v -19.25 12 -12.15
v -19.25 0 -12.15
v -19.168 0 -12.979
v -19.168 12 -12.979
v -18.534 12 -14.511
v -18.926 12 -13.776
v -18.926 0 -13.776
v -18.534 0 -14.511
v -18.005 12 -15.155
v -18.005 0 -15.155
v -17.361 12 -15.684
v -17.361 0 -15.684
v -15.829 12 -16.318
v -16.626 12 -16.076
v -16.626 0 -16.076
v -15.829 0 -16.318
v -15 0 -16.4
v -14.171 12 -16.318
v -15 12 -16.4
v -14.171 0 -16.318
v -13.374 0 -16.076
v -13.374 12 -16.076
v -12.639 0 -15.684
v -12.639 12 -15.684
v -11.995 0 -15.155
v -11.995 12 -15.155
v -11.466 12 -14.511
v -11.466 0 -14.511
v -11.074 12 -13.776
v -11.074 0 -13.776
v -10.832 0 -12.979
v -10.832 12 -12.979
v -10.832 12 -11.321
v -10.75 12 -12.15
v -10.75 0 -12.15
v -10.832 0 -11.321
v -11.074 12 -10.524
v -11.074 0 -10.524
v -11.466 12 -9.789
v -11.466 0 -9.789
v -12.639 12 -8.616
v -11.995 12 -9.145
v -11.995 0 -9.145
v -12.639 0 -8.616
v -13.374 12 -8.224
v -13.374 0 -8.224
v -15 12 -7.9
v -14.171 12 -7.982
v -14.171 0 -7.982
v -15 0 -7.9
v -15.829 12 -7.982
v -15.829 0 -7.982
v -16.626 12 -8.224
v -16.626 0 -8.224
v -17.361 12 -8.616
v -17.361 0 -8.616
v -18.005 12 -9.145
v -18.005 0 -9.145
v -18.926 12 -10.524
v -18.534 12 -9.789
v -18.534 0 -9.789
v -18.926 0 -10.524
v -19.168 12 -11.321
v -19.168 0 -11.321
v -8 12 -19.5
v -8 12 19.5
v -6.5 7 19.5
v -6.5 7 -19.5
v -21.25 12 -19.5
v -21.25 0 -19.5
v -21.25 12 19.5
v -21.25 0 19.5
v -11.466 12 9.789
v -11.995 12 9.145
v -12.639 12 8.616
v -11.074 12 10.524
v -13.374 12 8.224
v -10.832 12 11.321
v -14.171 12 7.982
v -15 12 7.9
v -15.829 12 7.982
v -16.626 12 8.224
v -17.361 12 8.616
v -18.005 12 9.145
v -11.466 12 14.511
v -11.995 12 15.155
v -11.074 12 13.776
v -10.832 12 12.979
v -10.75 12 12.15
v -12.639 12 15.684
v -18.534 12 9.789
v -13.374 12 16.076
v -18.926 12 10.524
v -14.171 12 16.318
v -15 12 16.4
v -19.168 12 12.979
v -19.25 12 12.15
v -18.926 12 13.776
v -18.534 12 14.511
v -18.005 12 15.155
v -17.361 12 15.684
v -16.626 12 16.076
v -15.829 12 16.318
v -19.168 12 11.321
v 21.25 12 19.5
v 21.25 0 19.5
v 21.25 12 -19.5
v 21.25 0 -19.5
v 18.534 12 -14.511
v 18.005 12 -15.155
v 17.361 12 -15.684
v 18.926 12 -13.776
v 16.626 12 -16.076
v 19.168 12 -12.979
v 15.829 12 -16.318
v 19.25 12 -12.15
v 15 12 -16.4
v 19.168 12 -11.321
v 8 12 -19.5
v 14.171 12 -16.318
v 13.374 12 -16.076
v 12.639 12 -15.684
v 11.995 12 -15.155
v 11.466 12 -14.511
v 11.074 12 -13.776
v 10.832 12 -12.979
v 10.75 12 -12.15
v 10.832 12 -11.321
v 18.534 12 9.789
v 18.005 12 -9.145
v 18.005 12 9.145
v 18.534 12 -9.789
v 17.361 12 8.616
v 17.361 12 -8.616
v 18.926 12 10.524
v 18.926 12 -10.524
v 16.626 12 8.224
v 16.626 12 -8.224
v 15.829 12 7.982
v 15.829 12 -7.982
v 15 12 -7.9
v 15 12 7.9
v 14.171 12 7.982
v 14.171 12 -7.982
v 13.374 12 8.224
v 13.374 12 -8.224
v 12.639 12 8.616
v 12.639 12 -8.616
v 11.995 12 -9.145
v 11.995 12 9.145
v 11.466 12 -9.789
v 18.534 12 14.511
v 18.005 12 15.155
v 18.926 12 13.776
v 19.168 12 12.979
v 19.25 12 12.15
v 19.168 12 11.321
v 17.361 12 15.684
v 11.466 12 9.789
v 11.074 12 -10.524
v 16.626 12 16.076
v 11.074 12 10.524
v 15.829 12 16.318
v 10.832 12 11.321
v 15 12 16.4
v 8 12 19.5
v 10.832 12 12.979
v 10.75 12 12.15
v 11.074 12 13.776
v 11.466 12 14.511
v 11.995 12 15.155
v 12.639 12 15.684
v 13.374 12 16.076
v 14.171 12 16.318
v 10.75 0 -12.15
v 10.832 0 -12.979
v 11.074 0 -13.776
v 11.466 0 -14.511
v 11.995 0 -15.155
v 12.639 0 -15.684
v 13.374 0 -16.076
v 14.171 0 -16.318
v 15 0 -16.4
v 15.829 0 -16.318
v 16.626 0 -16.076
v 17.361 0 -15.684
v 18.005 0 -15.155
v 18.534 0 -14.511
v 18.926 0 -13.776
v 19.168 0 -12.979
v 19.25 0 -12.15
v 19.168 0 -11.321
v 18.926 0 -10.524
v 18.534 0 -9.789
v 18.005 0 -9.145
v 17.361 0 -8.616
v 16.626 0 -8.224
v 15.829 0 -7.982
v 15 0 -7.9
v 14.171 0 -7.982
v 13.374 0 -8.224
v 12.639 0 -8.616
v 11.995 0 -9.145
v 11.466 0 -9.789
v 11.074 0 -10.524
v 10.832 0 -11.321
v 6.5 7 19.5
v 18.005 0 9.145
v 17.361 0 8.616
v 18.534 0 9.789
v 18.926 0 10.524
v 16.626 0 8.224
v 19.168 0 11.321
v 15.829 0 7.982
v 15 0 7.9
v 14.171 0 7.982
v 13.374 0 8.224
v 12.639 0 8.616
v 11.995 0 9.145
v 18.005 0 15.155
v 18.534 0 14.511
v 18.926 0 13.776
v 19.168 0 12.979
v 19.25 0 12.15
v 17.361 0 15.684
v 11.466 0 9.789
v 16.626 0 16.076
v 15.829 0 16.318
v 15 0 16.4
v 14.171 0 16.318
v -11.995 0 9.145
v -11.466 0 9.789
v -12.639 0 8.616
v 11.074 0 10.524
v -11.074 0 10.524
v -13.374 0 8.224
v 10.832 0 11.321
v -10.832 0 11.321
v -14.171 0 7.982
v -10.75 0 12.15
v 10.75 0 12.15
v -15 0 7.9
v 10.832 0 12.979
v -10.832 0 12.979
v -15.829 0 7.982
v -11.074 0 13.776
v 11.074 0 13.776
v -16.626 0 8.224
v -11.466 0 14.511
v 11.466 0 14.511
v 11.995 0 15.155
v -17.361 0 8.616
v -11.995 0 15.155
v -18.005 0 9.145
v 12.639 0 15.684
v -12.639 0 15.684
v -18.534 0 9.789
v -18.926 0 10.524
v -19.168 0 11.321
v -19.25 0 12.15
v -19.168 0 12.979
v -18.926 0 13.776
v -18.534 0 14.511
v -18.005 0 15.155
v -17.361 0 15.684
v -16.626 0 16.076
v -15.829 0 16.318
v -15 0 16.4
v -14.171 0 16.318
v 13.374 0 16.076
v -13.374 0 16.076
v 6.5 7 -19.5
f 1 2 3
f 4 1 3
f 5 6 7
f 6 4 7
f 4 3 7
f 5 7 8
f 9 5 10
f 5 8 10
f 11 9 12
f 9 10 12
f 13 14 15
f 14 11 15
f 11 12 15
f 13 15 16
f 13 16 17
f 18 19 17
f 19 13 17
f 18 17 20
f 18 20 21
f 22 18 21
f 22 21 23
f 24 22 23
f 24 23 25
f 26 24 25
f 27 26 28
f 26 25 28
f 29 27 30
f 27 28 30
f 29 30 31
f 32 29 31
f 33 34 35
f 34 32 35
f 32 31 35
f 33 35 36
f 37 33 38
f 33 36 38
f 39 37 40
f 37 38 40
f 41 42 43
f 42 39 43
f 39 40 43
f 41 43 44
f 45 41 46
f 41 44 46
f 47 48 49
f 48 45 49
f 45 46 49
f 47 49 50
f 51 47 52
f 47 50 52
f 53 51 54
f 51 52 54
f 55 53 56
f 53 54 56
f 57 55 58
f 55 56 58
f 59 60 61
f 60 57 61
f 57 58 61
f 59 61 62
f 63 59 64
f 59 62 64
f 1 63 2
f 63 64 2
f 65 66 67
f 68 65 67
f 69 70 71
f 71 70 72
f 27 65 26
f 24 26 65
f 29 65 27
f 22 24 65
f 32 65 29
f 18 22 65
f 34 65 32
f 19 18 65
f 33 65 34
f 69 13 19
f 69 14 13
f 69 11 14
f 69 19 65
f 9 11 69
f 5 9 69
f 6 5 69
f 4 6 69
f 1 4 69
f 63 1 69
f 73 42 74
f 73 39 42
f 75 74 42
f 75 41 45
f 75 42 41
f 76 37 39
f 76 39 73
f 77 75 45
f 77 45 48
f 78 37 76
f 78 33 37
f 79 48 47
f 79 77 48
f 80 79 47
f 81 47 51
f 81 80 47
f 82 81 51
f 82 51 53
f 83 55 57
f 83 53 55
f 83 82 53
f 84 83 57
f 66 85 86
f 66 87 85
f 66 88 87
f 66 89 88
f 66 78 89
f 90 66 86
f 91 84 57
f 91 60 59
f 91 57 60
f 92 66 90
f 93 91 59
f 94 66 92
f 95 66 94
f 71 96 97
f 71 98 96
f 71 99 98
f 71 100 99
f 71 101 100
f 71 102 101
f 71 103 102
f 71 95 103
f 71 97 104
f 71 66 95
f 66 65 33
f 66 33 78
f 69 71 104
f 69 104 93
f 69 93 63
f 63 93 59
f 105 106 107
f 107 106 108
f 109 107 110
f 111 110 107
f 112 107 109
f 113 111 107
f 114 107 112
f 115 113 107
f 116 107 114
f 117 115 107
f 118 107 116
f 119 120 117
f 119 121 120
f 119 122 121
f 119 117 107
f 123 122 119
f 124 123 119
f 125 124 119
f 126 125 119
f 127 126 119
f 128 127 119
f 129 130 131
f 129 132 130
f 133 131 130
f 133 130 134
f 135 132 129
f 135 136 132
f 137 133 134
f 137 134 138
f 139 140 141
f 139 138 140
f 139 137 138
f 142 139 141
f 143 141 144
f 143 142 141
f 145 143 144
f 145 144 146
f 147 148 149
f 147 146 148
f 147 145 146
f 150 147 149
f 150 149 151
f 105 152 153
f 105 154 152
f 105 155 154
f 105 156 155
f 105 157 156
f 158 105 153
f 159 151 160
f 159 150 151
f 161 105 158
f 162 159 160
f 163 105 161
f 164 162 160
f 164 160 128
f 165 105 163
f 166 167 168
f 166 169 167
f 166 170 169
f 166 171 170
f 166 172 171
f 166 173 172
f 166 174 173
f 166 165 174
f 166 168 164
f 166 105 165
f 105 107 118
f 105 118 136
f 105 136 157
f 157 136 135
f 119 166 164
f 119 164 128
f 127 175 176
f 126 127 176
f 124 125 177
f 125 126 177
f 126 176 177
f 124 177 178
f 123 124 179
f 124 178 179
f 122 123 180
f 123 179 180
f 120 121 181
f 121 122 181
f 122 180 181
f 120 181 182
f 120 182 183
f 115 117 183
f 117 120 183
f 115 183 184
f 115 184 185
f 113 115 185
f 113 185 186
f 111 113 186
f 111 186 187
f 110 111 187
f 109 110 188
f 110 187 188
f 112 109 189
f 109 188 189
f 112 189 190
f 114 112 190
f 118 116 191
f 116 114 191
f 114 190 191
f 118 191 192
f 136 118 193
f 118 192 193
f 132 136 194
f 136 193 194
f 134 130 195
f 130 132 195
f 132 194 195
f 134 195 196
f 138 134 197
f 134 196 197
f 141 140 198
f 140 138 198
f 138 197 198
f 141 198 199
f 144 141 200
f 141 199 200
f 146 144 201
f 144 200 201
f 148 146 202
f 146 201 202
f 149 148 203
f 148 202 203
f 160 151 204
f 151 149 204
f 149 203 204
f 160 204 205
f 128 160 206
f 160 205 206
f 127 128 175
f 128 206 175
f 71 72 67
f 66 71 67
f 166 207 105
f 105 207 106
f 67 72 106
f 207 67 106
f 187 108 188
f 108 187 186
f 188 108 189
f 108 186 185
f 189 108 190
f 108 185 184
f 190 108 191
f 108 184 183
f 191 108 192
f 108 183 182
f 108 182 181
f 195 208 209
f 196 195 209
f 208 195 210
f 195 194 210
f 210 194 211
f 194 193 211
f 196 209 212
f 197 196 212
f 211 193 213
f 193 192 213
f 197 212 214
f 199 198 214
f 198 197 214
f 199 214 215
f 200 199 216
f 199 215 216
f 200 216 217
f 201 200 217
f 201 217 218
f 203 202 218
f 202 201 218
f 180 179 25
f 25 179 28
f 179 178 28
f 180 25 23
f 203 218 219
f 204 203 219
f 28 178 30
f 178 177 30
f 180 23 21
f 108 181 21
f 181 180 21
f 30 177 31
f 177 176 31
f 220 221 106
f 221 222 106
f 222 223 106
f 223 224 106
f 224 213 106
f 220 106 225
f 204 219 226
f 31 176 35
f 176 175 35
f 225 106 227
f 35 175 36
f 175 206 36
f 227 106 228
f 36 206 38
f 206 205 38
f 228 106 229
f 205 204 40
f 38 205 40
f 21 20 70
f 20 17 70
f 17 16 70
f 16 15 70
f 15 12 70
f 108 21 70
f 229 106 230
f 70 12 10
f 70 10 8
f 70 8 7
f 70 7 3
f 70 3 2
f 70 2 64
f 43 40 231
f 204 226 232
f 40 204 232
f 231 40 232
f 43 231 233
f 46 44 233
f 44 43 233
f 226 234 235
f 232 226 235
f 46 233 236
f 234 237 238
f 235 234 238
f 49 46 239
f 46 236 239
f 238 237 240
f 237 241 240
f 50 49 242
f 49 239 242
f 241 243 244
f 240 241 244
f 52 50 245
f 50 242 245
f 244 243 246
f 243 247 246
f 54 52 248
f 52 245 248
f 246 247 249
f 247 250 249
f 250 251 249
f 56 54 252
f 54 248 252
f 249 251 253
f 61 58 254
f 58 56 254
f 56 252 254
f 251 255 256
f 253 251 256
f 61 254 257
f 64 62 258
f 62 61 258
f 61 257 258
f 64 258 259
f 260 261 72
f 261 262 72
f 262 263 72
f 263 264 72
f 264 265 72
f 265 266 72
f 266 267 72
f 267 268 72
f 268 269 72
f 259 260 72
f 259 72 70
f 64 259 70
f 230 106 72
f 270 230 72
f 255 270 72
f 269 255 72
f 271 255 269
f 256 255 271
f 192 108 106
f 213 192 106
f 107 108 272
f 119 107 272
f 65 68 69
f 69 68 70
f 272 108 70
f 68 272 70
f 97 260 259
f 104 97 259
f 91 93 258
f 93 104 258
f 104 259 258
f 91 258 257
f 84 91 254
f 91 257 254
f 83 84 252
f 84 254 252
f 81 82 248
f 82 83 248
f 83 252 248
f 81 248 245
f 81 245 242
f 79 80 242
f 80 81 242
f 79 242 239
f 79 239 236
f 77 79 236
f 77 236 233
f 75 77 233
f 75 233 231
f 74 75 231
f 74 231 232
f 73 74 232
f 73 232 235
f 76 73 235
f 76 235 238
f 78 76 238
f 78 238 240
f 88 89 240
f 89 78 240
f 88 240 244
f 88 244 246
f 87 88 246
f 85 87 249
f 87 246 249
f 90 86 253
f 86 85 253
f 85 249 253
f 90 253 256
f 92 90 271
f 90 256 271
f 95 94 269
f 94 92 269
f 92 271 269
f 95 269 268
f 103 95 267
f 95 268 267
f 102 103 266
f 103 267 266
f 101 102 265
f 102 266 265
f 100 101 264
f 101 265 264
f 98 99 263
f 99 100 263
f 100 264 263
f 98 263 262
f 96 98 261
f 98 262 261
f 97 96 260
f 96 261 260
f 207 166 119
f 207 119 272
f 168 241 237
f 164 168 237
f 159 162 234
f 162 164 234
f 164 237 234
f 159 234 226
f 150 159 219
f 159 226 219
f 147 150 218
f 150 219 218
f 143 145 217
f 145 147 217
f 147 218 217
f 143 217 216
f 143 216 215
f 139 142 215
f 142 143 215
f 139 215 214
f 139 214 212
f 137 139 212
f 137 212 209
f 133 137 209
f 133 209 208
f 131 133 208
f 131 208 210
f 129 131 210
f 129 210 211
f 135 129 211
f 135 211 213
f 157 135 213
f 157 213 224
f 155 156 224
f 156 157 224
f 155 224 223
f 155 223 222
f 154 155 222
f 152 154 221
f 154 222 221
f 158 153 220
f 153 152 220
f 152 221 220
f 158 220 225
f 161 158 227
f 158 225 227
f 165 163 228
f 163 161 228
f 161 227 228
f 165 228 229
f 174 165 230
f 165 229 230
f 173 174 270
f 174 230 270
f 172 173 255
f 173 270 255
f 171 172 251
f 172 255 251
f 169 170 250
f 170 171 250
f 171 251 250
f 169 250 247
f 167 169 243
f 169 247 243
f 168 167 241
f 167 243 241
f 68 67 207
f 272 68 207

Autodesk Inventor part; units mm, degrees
sketch "Эскиз1" plane through (0, 0, 0) normal (0, 1, 0) x (-1, 0, 0)
  line L0 (21.25, 19.5) -> (-21.25, 19.5)
  line L1 (-21.25, 19.5) -> (-21.25, -19.5)
  line L2 (-21.25, -19.5) -> (21.25, -19.5)
  line L3 (21.25, -19.5) -> (21.25, 19.5)
  line L4 (21.25, 19.5) -> (-21.25, -19.5) construction
  line L5 (-21.25, 19.5) -> (21.25, -19.5) construction
  circle A0 centre (-15, -12.15) radius 4.25
  line L6 (0, -19.5) -> (0, 19.5) construction
  line L7 (-21.25, 0) -> (21.25, 0) construction
  circle A1 centre (15, -12.15) radius 4.25
  circle A2 centre (-15, 12.15) radius 4.25
  circle A3 centre (15, 12.15) radius 4.25
  point P0 (0, 0)
  dimension "d0" = 39
  dimension "d1" = 42.5
  dimension "d2" = 8.5
  dimension "d3" = 6.25
  dimension "d4" = 7.35
extrude "Выдавливание1" add sketch "Эскиз1" along normal blind 12
sketch "Эскиз2" plane through (-21.25, 0, 19.5) normal (0, 0, 1) x (1, 0, 0)
  line L0 (14.75, 7) -> (27.75, 7)
  line L1 (0, 12) -> (42.5, 12) projected
  line L2 (13.25, 12) -> (29.25, 12)
  line L3 (21.25, 14.4) -> (21.25, -2.4) construction
  line L4 (13.25, 12) -> (14.75, 7)
  line L5 (29.25, 12) -> (27.75, 7)
  point P0 (21.25, 0)
  point P1 (21.25, 12)
  point P2 (21.25, 7)
  point P3 (13.25, 12)
  dimension "d7" = 13
  dimension "d8" = 5
  dimension "d9" = 16
extrude "Выдавливание2" cut sketch "Эскиз2" against normal up to surface (39 mm away)
properties part number "Крепление мотора2"
